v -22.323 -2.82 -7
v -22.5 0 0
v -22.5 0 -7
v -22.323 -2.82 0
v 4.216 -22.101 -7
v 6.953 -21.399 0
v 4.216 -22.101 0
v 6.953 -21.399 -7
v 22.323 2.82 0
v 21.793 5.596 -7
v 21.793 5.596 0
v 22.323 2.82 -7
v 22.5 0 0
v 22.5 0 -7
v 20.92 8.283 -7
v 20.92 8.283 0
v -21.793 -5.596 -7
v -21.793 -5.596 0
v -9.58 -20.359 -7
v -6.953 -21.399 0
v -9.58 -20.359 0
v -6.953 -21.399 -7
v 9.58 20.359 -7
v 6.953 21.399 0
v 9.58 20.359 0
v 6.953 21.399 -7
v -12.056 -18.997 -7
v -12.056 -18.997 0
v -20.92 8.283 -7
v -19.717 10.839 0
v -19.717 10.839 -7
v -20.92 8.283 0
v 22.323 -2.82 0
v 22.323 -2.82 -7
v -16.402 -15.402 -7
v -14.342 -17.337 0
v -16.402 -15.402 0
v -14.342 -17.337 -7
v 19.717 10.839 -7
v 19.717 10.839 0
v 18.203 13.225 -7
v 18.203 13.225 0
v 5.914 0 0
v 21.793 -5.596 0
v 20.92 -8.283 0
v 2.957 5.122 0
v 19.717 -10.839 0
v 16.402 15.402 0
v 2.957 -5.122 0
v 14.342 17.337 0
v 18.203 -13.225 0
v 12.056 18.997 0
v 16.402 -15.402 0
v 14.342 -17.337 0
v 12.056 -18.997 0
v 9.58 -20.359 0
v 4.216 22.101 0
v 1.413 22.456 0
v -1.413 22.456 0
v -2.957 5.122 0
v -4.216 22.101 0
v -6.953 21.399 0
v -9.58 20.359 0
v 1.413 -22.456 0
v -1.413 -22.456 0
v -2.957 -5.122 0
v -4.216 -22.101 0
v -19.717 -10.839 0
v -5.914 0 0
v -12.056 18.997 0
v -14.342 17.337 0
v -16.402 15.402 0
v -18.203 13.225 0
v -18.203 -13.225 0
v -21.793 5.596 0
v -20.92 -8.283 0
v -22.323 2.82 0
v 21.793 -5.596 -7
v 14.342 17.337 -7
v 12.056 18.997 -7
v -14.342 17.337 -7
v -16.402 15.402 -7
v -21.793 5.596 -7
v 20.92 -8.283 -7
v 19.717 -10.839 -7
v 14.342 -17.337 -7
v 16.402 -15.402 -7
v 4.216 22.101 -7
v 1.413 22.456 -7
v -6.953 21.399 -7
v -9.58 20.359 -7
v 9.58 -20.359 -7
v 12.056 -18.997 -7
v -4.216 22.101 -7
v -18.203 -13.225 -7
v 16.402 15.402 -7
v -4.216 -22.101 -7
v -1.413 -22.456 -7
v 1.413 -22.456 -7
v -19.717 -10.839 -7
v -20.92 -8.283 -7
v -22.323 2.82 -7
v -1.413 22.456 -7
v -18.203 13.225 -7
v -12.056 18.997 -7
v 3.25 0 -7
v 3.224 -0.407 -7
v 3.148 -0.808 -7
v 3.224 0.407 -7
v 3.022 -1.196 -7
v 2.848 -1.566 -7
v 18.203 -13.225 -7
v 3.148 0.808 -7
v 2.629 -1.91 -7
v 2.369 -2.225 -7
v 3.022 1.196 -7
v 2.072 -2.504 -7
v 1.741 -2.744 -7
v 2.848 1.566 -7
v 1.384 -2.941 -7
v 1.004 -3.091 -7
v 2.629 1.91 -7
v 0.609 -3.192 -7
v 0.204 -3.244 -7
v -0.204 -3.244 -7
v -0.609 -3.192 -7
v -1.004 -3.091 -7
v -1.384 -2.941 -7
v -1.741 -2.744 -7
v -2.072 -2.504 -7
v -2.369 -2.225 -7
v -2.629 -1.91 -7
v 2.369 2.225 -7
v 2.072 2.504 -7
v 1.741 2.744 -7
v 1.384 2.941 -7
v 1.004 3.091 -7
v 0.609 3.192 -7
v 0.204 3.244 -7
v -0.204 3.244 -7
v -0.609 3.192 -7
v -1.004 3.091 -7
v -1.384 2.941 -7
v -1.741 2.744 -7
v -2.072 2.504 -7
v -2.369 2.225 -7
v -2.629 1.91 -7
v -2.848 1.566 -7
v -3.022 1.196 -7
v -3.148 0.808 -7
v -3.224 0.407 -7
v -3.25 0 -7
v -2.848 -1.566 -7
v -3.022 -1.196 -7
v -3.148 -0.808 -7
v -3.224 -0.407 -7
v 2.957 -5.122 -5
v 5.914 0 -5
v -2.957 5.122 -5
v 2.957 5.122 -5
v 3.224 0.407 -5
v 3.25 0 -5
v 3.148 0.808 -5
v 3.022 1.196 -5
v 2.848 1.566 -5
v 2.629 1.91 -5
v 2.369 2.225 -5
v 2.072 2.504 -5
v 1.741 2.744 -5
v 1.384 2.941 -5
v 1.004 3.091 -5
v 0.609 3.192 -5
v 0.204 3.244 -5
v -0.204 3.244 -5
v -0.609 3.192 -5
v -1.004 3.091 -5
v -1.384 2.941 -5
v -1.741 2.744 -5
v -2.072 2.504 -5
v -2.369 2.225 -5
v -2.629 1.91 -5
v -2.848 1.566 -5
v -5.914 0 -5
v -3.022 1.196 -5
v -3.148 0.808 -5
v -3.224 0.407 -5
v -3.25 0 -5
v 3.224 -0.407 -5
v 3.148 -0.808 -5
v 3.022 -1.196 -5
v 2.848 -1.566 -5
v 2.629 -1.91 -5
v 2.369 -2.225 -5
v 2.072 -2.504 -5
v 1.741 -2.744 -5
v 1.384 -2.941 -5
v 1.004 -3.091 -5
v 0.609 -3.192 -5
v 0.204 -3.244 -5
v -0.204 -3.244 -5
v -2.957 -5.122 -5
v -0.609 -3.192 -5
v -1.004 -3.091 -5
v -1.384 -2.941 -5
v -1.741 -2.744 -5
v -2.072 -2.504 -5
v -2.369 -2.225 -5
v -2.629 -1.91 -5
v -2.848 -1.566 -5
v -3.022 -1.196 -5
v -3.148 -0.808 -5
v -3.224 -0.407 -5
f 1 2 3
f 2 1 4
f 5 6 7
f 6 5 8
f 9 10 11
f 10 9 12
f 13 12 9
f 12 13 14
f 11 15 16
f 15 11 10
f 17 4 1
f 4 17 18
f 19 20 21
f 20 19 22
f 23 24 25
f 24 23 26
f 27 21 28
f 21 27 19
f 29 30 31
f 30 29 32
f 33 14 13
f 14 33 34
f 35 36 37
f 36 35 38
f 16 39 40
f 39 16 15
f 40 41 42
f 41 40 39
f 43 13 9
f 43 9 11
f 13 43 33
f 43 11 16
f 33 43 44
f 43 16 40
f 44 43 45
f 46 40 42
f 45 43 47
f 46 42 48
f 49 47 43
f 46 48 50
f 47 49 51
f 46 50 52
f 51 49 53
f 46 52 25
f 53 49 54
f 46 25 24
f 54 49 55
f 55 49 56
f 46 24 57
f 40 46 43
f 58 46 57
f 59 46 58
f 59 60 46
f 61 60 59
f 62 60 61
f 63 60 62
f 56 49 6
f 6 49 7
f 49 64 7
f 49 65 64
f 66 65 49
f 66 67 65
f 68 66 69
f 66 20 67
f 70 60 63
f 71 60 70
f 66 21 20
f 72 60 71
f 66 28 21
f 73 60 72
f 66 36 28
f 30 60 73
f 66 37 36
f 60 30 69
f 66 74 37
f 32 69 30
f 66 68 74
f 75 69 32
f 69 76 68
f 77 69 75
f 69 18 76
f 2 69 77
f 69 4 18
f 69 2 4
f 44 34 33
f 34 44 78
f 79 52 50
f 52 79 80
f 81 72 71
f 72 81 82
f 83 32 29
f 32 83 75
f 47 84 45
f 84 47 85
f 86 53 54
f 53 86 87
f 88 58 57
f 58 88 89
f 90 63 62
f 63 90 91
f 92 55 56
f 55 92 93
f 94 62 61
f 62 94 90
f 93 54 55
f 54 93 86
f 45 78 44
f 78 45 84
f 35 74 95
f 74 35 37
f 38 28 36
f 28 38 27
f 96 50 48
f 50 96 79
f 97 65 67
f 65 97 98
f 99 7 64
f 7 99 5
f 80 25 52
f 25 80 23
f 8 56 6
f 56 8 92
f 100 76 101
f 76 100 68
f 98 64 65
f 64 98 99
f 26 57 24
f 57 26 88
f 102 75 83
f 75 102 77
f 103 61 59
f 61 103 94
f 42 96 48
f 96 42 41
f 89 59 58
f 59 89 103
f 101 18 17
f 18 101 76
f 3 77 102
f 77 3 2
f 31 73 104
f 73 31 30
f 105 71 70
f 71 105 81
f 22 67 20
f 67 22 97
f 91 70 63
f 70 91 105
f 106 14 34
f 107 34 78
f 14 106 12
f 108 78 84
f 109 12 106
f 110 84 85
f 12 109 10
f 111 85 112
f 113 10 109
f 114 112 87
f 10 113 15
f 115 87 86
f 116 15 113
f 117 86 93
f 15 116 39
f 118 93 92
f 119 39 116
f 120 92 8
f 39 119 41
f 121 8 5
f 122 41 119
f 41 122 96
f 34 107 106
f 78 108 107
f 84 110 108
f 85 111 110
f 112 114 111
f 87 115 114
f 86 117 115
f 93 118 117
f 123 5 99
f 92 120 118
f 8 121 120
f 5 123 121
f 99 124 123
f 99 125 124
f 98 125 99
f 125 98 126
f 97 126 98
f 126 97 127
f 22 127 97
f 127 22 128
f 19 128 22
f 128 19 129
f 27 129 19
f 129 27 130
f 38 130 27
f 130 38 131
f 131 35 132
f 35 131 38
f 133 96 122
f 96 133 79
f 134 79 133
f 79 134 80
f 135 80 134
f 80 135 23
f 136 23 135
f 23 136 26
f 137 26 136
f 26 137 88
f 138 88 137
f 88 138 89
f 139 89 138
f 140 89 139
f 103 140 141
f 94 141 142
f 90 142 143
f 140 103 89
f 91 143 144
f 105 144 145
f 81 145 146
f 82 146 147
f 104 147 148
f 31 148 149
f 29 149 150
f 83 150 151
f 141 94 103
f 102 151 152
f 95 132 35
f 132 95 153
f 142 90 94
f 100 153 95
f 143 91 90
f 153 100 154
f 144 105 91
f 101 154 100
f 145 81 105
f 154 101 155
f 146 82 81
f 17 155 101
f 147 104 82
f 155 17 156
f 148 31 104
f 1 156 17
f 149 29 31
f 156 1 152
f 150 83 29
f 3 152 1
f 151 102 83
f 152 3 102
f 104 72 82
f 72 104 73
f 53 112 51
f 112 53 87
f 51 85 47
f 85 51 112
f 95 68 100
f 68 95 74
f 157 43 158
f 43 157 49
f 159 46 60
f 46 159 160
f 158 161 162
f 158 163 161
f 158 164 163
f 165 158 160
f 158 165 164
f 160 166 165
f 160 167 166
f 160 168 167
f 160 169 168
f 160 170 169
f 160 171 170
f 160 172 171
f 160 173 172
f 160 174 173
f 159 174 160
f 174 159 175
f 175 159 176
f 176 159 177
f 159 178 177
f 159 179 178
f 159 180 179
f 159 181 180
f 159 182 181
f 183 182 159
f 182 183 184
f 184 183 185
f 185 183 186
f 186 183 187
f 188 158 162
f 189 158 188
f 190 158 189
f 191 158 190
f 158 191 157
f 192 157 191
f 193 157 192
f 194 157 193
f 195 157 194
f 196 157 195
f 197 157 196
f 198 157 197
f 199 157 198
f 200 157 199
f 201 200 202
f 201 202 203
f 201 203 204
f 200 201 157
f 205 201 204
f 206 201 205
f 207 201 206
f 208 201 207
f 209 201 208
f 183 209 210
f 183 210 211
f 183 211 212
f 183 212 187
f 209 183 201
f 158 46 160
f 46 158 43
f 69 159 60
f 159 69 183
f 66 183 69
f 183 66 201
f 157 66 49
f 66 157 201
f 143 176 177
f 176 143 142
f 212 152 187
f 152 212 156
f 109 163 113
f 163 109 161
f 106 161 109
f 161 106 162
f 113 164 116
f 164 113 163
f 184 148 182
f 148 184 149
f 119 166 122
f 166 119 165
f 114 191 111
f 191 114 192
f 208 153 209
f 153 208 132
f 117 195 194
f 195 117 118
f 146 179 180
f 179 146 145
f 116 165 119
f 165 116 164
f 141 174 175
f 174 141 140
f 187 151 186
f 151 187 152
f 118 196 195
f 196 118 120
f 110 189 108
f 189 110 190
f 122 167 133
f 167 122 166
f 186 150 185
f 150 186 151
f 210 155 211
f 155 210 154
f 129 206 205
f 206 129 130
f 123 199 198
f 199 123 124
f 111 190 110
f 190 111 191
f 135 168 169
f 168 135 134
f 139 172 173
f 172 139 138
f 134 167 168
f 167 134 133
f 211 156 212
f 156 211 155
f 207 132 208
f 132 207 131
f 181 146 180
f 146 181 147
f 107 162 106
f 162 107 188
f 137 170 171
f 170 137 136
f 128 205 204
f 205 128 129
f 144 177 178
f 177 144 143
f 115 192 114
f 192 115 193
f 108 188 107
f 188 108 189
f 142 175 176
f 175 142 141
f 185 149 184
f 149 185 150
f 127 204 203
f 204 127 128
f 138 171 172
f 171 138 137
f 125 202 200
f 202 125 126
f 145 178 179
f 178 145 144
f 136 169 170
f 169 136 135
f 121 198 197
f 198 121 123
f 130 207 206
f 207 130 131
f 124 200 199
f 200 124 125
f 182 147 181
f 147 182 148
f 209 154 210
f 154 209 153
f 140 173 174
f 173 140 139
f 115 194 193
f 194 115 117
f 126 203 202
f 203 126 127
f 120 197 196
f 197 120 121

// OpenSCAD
$fn = 50;


difference() {
	union() {
		translate(v = [0, 0, -7.0000000000]) {
			cylinder(h = 7.0000000000, r = 22.5000000000);
		}
		#translate(v = [0, 0, -8.5000000000]) {
			cylinder(h = 8.5000000000, r = 2.8750000000);
		}
	}
	union() {
		translate(v = [0, 0, 0]) {
			rotate(a = [0, 0, 0]) {
				difference() {
					union() {
						translate(v = [0, 0, -5]) {
							linear_extrude(height = 5) {
								polygon(points = [[5.9142500000, 0.0000000000], [2.9571250000, 5.1218907443], [-2.9571250000, 5.1218907443], [-5.9142500000, 0.0000000000], [-2.9571250000, -5.1218907443], [2.9571250000, -5.1218907443]]);
							}
						}
					}
					union();
				}
			}
		}
		#translate(v = [0, 0, -100.0000000000]) {
			cylinder(h = 200, r = 3.2500000000);
		}
	}
}
